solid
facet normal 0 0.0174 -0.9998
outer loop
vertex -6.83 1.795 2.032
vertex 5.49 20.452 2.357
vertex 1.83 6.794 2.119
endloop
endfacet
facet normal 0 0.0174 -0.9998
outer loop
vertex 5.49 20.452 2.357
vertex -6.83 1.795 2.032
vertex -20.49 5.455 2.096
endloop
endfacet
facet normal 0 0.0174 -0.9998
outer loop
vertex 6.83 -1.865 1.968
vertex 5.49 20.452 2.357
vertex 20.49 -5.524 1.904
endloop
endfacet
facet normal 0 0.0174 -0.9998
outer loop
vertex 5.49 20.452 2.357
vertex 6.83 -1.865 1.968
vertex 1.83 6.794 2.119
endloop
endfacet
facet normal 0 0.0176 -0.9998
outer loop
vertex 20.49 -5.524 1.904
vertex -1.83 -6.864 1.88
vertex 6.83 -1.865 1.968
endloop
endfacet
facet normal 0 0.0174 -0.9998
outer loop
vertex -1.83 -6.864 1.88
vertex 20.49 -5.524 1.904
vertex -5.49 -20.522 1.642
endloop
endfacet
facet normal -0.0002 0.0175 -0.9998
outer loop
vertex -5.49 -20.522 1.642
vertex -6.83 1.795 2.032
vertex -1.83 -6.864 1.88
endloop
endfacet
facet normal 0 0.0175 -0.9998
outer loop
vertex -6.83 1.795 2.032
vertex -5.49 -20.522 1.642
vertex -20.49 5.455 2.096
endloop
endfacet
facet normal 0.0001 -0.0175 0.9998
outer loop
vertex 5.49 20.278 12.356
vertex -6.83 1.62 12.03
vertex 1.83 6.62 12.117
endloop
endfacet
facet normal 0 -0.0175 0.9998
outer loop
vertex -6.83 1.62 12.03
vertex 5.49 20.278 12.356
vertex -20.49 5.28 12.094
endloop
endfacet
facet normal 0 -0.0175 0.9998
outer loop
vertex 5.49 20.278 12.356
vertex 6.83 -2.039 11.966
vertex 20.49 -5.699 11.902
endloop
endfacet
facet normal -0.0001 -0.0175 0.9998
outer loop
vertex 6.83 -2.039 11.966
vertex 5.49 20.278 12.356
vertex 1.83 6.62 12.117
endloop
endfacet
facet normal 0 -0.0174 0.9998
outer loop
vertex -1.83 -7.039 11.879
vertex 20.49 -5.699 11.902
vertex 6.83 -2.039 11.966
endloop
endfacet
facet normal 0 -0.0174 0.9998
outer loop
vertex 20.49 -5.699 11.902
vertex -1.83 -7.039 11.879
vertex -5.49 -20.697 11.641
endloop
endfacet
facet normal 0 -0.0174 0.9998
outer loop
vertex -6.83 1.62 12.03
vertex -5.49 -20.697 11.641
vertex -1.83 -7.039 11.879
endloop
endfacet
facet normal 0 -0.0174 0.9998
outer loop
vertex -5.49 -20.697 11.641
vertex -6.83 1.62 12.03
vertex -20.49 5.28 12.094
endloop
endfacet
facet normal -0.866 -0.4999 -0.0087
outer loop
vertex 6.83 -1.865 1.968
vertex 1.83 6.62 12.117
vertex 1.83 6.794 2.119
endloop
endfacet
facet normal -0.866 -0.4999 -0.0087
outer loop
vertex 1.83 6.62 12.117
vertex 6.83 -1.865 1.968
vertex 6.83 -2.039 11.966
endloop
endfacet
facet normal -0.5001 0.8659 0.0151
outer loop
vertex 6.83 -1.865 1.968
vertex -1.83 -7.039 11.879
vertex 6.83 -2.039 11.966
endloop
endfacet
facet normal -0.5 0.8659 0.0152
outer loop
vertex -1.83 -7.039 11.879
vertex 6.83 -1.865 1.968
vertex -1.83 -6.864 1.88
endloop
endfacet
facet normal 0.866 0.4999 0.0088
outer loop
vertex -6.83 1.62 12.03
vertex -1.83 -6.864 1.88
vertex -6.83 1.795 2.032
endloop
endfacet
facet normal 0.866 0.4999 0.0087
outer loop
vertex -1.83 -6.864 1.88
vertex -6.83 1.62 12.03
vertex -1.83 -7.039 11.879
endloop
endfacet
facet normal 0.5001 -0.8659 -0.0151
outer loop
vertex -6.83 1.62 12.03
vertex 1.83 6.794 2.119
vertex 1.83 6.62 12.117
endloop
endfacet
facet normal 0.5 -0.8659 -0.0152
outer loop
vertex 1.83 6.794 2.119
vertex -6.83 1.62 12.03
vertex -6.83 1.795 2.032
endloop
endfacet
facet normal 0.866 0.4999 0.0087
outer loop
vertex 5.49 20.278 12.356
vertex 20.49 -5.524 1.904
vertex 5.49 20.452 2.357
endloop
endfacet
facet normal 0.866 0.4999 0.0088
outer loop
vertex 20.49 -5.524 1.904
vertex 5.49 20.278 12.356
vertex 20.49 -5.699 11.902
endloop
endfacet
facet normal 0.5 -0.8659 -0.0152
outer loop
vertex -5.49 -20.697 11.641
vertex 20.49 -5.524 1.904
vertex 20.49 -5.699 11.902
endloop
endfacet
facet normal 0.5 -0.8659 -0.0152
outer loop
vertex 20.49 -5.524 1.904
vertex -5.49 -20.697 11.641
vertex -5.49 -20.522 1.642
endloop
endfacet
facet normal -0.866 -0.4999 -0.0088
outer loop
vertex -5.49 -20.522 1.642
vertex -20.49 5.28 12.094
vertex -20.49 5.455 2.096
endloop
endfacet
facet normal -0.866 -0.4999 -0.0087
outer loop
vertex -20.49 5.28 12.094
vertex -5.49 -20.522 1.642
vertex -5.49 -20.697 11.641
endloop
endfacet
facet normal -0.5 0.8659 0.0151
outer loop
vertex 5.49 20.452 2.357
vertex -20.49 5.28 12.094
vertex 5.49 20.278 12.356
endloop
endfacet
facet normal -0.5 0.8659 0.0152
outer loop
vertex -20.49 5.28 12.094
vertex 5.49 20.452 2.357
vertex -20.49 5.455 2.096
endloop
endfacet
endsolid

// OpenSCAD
rotate([1,0,0]) translate([0,0,2]) union() {
    rotate([0,0,30])
    translate([-15,-15,0]) {
        scale(10) {
            polyhedron(
                //         1------------------0
                //        /|                 /|
                //       / |    9----8      / |
                //      /  5-- /|   /| ----/--4
                //     /  /  11----10|    /  /
                //    /  /    |13--|-12  /  /
                //   3------  |/   |/ --2  /
                //   | /     15----14   | /
                //   |/                 |/
                //   7------------------6
                points=[
                    [3,3,1],
                    [0,3,1],
                    [3,0,1],
                    [0,0,1],
                    [3,3,0],
                    [0,3,0],
                    [3,0,0],
                    [0,0,0],

                    [2,2,1],
                    [1,2,1],
                    [2,1,1],
                    [1,1,1],
                    [2,2,0],
                    [1,2,0],
                    [2,1,0],
                    [1,1,0],
                ],
                faces=[
                    [  4,  5, 13, 12 ],
                    [  4, 12, 14,  6 ],
                    [  6, 14, 15,  7 ],
                    [  7, 15, 13,  5 ],

                    [  1,  0,  8,  9 ],
                    [  0,  2, 10,  8 ],
                    [  2,  3, 11, 10 ],
                    [  3,  1,  9, 11 ],

                    [  8, 10, 14, 12 ],
                    [ 10, 11, 15, 14 ],
                    [ 11,  9, 13, 15 ],
                    [  9,  8, 12, 13 ],

                    [  0,  4,  6,  2 ],
                    [  2,  6,  7,  3 ],
                    [  3,  7,  5,  1 ],
                    [  1,  5,  4,  0 ],
                ]
            );
        };
    }
}
